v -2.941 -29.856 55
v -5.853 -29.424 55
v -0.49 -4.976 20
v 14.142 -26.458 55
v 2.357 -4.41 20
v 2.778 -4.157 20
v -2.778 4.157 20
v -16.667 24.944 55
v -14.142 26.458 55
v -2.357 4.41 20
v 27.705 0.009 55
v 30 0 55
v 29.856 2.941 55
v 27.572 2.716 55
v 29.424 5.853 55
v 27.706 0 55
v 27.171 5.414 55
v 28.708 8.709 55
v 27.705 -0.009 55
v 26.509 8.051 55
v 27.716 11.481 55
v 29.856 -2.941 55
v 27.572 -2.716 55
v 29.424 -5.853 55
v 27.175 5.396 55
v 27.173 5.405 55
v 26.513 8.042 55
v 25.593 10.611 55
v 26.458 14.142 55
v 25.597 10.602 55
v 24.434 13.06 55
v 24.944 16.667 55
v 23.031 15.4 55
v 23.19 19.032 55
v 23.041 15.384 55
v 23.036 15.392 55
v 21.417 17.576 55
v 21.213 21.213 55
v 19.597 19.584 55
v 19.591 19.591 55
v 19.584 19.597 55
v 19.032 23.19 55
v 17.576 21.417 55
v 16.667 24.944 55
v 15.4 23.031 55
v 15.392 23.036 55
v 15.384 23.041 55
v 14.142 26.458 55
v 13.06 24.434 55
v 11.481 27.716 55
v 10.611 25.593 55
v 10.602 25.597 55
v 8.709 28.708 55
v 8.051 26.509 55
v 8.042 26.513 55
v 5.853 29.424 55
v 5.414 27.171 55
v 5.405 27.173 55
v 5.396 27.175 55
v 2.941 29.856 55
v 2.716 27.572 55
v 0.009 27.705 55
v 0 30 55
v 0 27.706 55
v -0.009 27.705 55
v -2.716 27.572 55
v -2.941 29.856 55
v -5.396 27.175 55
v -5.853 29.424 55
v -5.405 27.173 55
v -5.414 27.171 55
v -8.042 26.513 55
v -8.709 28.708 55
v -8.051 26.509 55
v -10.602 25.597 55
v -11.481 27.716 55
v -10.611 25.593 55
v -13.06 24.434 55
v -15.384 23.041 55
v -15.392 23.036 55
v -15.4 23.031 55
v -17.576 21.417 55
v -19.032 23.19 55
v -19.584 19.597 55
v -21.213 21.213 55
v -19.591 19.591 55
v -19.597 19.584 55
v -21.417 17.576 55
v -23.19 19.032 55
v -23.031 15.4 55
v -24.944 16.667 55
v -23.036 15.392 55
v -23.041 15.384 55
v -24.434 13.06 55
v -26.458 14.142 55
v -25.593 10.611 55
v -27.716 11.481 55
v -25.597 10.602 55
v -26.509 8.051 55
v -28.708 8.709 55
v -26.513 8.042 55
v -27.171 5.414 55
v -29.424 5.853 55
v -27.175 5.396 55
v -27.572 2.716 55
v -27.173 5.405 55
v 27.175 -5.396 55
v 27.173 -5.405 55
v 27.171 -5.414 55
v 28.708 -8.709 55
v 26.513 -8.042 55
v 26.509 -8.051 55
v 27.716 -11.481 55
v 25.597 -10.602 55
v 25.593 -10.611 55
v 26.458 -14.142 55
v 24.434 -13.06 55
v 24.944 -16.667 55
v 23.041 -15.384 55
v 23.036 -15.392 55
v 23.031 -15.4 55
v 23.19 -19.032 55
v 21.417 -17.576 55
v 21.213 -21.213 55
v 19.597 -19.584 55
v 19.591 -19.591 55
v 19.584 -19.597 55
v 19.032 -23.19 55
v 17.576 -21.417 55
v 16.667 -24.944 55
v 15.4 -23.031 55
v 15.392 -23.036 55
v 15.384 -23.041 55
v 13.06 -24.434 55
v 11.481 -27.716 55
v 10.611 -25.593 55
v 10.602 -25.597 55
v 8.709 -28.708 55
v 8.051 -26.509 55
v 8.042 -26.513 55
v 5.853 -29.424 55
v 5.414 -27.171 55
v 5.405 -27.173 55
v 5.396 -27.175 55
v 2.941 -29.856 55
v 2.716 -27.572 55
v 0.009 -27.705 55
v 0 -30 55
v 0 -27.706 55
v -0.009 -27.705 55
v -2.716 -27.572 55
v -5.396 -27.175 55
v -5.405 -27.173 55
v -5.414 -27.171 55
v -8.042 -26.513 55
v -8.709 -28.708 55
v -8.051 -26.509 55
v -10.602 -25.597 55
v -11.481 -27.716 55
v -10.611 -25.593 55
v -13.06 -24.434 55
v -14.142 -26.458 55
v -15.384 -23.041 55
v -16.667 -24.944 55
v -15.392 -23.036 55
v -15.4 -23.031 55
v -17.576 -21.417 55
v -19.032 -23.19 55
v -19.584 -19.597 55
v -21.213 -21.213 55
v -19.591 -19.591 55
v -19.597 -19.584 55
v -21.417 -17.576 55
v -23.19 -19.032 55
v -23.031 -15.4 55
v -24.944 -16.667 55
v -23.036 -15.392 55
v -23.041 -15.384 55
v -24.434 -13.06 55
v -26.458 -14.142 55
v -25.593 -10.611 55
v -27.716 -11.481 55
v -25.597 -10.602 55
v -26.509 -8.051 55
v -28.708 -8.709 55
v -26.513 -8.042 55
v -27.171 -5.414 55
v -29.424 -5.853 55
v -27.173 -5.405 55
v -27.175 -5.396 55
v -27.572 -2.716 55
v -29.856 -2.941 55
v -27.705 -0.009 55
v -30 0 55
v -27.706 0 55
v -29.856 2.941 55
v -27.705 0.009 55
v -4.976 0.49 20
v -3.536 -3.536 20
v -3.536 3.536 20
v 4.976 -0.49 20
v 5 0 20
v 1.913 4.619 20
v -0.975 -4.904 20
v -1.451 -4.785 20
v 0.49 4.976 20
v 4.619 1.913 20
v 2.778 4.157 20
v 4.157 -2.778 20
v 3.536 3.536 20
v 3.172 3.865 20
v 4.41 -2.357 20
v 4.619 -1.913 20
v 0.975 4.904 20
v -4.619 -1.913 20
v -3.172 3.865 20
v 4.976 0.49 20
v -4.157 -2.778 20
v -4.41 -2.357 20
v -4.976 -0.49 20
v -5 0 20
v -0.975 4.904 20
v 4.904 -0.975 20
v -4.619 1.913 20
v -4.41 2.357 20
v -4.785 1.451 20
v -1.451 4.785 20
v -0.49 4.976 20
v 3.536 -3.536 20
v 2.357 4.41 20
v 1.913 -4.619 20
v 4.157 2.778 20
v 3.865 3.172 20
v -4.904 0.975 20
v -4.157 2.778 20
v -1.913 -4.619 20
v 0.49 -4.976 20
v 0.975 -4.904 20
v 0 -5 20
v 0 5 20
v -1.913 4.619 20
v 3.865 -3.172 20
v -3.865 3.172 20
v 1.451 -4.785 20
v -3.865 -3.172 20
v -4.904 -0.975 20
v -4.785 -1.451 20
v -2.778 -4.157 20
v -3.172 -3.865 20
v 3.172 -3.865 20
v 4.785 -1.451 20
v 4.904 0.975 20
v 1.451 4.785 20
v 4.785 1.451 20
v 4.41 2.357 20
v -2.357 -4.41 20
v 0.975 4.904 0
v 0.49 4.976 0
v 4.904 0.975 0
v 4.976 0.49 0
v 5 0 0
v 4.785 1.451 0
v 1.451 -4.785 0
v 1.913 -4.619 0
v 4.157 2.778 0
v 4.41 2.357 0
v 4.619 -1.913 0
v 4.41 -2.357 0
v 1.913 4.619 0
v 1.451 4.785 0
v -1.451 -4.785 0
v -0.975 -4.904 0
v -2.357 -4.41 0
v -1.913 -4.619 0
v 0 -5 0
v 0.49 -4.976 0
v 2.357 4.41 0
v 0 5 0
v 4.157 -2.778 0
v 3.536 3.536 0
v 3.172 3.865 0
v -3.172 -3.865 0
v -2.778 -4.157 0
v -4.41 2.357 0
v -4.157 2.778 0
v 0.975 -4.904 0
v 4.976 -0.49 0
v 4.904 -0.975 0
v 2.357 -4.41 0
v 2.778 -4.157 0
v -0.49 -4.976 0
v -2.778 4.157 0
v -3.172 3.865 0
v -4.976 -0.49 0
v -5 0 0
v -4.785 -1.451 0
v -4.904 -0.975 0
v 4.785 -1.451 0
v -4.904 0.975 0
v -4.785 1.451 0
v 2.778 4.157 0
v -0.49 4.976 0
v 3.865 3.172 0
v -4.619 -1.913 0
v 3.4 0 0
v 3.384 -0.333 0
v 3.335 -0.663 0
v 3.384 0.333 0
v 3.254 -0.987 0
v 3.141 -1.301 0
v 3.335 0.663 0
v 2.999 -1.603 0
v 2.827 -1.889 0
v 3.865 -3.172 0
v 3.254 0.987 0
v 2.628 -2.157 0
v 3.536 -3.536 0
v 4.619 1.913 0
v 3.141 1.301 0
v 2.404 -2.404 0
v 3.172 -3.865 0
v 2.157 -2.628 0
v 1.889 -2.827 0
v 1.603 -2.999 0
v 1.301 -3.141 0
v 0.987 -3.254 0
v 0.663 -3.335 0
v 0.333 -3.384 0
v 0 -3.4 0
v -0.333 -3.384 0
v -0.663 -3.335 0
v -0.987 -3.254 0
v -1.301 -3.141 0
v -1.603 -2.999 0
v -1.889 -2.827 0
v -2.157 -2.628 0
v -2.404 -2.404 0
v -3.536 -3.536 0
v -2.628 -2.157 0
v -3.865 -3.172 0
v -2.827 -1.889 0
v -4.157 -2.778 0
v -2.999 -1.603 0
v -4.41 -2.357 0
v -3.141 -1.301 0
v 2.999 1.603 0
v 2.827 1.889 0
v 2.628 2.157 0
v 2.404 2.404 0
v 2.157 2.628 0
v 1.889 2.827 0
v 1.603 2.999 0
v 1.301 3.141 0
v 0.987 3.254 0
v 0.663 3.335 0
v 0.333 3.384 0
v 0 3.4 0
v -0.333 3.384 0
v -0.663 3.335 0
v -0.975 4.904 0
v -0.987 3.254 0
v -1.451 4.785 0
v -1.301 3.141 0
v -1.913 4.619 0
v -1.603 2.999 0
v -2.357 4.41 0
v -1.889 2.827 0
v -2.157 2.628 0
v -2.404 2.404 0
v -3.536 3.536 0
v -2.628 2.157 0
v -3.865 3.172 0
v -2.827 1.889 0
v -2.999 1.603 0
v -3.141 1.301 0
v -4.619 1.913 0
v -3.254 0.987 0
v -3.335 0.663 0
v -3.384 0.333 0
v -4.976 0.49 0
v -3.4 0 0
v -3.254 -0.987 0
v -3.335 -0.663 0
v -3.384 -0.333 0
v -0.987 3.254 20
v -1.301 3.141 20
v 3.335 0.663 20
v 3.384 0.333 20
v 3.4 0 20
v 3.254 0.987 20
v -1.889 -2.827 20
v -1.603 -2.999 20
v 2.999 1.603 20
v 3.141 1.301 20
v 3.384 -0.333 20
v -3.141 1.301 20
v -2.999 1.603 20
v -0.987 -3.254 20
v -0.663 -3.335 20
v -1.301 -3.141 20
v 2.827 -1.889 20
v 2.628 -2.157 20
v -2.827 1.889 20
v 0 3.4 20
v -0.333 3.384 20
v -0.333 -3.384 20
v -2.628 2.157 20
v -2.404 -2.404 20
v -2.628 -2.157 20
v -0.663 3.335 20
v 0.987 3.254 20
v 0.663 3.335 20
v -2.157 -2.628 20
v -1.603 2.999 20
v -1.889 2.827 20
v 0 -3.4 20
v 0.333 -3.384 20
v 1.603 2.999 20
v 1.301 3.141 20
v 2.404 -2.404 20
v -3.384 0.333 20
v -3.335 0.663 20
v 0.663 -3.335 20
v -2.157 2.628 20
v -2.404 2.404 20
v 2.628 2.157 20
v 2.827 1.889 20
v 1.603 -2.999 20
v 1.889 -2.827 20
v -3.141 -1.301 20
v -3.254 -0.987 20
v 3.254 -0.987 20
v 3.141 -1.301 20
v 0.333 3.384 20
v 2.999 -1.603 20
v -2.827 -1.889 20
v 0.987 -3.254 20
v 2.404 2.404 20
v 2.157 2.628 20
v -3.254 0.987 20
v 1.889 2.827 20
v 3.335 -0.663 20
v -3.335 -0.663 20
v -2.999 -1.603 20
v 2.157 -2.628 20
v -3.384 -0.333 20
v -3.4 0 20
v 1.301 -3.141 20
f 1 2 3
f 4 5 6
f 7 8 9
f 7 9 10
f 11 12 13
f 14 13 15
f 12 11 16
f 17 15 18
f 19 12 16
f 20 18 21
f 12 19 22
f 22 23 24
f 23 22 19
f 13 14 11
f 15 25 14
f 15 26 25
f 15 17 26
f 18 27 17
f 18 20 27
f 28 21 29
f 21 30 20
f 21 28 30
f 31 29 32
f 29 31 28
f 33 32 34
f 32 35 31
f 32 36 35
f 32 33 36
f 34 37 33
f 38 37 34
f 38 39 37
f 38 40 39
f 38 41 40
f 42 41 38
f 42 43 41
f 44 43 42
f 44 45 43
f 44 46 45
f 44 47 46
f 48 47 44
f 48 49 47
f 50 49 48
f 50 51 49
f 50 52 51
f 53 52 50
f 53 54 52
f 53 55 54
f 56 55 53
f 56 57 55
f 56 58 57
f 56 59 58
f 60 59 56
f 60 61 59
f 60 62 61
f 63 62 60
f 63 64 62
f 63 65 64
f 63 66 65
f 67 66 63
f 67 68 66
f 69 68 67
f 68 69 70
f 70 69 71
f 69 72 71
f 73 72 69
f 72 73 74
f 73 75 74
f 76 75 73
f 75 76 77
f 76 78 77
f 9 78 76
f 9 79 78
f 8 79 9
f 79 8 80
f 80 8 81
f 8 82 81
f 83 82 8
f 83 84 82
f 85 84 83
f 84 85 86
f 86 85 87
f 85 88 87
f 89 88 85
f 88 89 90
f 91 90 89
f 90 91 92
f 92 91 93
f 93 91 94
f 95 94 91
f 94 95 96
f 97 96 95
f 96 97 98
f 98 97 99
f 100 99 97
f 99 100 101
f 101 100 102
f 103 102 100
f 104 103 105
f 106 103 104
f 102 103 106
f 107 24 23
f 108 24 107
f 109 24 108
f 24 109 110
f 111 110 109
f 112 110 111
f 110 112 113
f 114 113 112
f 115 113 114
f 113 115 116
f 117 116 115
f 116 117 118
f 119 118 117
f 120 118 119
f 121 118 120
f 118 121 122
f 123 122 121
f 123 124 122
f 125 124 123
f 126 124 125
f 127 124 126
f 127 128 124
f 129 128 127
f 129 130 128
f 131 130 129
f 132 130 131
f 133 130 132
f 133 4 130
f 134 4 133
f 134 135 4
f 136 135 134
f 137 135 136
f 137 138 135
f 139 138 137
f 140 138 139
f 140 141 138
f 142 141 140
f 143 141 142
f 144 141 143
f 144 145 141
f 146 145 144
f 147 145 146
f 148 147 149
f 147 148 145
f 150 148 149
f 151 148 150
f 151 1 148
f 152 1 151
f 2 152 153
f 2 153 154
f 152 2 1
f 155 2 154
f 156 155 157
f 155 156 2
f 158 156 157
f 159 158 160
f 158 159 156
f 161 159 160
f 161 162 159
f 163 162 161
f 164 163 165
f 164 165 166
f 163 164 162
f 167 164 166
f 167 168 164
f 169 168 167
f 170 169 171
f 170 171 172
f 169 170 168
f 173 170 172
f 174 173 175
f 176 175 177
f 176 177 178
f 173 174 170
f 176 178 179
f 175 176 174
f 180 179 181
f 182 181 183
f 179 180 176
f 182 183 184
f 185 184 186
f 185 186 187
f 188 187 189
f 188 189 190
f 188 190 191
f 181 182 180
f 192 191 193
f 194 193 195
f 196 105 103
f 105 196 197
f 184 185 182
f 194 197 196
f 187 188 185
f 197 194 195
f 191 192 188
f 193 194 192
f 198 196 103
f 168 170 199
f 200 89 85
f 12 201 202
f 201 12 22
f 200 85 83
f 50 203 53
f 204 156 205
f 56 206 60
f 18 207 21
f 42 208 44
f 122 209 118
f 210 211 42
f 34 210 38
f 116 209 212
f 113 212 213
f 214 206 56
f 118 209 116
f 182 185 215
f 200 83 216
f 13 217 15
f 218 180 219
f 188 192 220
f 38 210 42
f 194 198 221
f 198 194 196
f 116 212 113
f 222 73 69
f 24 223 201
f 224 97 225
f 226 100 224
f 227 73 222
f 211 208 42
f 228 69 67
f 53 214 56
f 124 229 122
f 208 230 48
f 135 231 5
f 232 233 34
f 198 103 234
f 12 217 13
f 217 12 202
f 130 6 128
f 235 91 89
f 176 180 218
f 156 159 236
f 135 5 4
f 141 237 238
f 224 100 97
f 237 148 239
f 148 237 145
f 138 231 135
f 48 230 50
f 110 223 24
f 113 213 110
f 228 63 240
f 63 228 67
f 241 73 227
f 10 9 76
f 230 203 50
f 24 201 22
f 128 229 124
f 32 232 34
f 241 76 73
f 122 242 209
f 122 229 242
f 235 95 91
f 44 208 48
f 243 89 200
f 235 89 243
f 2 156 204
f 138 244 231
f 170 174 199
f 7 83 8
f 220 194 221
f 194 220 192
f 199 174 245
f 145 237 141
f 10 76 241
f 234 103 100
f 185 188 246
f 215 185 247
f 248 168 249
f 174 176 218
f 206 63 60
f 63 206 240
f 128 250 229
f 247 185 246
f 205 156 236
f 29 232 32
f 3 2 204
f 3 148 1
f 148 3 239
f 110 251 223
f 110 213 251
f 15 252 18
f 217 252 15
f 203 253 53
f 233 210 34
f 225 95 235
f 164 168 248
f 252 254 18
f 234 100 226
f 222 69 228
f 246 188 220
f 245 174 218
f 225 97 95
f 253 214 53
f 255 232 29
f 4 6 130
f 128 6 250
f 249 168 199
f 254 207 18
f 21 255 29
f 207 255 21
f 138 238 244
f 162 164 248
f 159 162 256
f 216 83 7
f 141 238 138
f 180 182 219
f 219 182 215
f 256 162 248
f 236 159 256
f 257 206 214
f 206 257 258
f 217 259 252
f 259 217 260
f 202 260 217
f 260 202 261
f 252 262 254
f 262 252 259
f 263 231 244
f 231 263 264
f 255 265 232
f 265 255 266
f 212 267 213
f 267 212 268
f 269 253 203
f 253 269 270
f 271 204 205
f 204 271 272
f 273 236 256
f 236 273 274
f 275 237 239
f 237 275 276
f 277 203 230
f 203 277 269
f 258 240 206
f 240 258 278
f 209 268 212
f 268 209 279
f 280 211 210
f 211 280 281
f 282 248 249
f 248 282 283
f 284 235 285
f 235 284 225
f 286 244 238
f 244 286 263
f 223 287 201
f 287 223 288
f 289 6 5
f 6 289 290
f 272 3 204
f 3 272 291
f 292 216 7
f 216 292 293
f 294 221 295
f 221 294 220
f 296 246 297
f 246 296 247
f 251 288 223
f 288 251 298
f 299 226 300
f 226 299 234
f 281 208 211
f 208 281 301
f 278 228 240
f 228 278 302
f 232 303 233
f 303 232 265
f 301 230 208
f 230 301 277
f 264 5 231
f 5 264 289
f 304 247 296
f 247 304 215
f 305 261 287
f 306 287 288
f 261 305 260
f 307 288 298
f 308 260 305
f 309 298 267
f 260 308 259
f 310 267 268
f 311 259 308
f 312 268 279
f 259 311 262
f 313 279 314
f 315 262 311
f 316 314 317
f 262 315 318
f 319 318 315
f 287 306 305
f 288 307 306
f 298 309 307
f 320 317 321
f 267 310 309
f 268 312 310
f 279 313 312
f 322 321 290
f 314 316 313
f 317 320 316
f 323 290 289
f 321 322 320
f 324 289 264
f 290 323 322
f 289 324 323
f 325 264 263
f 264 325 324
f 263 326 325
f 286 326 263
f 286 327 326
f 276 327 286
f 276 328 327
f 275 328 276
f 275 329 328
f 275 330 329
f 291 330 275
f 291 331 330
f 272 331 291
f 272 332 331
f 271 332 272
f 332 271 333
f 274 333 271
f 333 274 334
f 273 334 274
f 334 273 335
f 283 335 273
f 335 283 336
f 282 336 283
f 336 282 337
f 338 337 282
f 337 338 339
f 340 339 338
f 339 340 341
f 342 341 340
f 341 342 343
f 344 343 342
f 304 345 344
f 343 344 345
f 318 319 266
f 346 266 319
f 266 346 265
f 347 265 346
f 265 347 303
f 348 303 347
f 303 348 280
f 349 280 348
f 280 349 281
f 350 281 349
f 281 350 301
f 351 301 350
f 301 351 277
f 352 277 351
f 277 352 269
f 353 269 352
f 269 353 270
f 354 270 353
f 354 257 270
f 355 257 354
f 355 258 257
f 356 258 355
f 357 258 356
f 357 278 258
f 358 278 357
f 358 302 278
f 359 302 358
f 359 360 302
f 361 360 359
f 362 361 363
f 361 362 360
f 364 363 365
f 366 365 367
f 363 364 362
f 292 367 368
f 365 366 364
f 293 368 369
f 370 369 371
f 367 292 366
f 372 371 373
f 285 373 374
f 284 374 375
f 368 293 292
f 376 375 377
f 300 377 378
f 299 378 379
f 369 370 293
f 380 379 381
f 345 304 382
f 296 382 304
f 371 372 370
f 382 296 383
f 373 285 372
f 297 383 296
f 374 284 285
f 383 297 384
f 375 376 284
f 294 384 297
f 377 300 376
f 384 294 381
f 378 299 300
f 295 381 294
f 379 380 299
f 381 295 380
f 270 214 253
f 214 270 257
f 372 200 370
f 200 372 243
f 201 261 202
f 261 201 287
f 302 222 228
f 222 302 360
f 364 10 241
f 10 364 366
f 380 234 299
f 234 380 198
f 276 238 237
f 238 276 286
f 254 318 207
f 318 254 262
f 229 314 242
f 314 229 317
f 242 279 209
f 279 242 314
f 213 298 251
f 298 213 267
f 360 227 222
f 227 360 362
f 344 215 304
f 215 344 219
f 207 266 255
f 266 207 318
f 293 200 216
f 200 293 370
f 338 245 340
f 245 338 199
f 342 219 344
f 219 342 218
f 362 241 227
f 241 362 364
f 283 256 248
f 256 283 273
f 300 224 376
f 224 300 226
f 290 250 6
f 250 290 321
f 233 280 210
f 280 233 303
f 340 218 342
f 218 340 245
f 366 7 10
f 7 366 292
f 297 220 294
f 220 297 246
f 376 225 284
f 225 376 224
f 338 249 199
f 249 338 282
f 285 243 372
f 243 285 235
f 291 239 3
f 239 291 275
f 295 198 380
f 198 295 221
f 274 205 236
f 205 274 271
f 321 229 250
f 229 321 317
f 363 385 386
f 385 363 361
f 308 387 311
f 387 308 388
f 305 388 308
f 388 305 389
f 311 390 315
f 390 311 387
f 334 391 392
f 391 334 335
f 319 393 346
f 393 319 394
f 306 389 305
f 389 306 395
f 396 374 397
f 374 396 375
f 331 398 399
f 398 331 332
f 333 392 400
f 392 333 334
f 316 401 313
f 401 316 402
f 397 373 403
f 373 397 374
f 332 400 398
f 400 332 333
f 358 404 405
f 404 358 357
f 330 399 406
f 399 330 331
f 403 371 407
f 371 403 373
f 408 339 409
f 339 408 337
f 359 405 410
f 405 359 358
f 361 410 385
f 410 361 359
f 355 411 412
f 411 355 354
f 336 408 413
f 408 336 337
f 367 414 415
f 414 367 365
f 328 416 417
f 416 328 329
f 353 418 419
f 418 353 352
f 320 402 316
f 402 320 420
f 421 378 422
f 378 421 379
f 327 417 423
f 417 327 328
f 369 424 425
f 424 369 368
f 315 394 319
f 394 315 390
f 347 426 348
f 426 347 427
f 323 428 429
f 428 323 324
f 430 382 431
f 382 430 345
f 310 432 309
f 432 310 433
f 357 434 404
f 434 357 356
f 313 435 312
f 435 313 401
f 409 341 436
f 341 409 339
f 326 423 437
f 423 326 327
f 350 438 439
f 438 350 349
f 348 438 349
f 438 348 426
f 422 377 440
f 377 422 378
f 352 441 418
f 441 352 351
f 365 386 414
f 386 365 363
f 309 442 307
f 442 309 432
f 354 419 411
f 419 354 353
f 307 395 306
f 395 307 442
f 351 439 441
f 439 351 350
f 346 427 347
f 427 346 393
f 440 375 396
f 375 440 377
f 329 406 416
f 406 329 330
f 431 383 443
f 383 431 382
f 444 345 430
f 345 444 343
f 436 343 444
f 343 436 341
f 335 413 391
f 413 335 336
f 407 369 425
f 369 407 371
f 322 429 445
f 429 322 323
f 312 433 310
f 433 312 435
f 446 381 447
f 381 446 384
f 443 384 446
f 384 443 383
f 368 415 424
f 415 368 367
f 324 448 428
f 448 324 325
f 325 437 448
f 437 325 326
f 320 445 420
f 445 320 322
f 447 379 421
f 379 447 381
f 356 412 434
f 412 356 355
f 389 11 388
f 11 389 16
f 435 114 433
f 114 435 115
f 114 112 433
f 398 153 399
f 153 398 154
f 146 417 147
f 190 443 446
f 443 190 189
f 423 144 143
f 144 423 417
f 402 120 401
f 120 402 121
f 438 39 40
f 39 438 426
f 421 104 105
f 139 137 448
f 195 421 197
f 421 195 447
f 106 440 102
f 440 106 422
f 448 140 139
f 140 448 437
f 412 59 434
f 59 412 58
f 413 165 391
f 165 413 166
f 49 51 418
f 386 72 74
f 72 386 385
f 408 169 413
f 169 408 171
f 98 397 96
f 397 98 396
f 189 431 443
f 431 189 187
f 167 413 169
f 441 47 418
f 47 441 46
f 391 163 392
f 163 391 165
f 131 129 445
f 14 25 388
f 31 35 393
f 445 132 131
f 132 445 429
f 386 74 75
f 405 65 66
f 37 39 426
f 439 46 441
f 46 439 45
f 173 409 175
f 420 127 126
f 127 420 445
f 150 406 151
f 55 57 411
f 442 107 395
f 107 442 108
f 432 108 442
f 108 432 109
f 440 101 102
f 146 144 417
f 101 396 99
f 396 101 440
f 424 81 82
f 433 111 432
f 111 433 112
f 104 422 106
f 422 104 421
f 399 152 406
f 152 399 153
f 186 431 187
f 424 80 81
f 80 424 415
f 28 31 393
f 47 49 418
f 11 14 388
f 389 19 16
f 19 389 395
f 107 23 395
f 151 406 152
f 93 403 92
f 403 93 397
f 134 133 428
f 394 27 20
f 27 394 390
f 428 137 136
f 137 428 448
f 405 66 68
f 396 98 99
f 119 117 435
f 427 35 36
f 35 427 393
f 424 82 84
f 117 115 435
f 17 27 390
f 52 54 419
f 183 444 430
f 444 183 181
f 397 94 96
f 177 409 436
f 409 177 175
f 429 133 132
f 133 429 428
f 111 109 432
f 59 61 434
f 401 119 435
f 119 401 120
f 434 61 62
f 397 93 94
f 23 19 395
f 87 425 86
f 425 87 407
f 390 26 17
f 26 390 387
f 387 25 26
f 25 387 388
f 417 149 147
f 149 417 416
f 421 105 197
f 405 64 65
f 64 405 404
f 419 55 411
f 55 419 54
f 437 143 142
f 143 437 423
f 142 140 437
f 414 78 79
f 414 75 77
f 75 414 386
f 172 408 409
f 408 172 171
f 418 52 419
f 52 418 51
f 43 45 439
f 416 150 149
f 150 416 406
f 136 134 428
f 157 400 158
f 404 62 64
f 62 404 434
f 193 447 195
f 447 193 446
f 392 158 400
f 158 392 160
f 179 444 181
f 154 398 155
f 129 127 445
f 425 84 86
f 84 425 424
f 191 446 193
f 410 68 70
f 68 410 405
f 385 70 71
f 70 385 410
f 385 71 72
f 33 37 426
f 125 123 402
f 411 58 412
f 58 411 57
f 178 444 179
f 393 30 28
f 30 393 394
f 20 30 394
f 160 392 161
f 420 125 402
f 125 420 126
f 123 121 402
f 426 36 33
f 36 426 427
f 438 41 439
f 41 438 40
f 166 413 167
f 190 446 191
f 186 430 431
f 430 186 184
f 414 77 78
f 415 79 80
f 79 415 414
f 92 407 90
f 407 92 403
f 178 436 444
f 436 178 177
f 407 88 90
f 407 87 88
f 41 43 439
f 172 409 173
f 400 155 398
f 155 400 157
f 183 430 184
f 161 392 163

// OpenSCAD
// Funnel - a conical mouth narrowing into a straight spout, hollow with a constant wall. NOVEL
// general part (a generic funnel, not any one labware item).
//
// @desc hollow funnel: conical mouth into a straight spout
// @prompt Design a funnel in OpenSCAD: a cone {top} mm across the mouth narrowing over {cone_h} mm to a spout {spout_d} mm across and {spout_l} mm long, with a {wall} mm wall throughout. Reply with a single complete OpenSCAD file.
// @param top     mouth diameter, mm   [30:90]
// @param spout_d spout diameter, mm   [6:20]
// @param cone_h  cone height, mm      [20:60]
// @param spout_l spout length, mm     [10:40]
// @param wall    wall thickness, mm   [1.2:3]

top     = 60;
spout_d = 10;
cone_h  = 35;
spout_l = 20;
wall    = 1.6;

$fn = 64;

ib = max(1.6, spout_d - 2 * wall);   // keep the spout bore open even if the wall is thick

translate([0, 0, spout_l])          // rest the spout tip on the bed (z = 0)
difference() {
    union() {
        cylinder(h = cone_h, d1 = spout_d, d2 = top);                 // cone: spout end up to mouth
        translate([0, 0, -spout_l]) cylinder(h = spout_l + 0.01, d = spout_d);   // spout below
    }
    translate([0, 0, -spout_l - 1])
        cylinder(h = spout_l + 1 + 0.01, d = ib);                     // bore through the spout
    cylinder(h = cone_h + 1, d1 = ib, d2 = top - 2 * wall);           // inner cone, open mouth
}
